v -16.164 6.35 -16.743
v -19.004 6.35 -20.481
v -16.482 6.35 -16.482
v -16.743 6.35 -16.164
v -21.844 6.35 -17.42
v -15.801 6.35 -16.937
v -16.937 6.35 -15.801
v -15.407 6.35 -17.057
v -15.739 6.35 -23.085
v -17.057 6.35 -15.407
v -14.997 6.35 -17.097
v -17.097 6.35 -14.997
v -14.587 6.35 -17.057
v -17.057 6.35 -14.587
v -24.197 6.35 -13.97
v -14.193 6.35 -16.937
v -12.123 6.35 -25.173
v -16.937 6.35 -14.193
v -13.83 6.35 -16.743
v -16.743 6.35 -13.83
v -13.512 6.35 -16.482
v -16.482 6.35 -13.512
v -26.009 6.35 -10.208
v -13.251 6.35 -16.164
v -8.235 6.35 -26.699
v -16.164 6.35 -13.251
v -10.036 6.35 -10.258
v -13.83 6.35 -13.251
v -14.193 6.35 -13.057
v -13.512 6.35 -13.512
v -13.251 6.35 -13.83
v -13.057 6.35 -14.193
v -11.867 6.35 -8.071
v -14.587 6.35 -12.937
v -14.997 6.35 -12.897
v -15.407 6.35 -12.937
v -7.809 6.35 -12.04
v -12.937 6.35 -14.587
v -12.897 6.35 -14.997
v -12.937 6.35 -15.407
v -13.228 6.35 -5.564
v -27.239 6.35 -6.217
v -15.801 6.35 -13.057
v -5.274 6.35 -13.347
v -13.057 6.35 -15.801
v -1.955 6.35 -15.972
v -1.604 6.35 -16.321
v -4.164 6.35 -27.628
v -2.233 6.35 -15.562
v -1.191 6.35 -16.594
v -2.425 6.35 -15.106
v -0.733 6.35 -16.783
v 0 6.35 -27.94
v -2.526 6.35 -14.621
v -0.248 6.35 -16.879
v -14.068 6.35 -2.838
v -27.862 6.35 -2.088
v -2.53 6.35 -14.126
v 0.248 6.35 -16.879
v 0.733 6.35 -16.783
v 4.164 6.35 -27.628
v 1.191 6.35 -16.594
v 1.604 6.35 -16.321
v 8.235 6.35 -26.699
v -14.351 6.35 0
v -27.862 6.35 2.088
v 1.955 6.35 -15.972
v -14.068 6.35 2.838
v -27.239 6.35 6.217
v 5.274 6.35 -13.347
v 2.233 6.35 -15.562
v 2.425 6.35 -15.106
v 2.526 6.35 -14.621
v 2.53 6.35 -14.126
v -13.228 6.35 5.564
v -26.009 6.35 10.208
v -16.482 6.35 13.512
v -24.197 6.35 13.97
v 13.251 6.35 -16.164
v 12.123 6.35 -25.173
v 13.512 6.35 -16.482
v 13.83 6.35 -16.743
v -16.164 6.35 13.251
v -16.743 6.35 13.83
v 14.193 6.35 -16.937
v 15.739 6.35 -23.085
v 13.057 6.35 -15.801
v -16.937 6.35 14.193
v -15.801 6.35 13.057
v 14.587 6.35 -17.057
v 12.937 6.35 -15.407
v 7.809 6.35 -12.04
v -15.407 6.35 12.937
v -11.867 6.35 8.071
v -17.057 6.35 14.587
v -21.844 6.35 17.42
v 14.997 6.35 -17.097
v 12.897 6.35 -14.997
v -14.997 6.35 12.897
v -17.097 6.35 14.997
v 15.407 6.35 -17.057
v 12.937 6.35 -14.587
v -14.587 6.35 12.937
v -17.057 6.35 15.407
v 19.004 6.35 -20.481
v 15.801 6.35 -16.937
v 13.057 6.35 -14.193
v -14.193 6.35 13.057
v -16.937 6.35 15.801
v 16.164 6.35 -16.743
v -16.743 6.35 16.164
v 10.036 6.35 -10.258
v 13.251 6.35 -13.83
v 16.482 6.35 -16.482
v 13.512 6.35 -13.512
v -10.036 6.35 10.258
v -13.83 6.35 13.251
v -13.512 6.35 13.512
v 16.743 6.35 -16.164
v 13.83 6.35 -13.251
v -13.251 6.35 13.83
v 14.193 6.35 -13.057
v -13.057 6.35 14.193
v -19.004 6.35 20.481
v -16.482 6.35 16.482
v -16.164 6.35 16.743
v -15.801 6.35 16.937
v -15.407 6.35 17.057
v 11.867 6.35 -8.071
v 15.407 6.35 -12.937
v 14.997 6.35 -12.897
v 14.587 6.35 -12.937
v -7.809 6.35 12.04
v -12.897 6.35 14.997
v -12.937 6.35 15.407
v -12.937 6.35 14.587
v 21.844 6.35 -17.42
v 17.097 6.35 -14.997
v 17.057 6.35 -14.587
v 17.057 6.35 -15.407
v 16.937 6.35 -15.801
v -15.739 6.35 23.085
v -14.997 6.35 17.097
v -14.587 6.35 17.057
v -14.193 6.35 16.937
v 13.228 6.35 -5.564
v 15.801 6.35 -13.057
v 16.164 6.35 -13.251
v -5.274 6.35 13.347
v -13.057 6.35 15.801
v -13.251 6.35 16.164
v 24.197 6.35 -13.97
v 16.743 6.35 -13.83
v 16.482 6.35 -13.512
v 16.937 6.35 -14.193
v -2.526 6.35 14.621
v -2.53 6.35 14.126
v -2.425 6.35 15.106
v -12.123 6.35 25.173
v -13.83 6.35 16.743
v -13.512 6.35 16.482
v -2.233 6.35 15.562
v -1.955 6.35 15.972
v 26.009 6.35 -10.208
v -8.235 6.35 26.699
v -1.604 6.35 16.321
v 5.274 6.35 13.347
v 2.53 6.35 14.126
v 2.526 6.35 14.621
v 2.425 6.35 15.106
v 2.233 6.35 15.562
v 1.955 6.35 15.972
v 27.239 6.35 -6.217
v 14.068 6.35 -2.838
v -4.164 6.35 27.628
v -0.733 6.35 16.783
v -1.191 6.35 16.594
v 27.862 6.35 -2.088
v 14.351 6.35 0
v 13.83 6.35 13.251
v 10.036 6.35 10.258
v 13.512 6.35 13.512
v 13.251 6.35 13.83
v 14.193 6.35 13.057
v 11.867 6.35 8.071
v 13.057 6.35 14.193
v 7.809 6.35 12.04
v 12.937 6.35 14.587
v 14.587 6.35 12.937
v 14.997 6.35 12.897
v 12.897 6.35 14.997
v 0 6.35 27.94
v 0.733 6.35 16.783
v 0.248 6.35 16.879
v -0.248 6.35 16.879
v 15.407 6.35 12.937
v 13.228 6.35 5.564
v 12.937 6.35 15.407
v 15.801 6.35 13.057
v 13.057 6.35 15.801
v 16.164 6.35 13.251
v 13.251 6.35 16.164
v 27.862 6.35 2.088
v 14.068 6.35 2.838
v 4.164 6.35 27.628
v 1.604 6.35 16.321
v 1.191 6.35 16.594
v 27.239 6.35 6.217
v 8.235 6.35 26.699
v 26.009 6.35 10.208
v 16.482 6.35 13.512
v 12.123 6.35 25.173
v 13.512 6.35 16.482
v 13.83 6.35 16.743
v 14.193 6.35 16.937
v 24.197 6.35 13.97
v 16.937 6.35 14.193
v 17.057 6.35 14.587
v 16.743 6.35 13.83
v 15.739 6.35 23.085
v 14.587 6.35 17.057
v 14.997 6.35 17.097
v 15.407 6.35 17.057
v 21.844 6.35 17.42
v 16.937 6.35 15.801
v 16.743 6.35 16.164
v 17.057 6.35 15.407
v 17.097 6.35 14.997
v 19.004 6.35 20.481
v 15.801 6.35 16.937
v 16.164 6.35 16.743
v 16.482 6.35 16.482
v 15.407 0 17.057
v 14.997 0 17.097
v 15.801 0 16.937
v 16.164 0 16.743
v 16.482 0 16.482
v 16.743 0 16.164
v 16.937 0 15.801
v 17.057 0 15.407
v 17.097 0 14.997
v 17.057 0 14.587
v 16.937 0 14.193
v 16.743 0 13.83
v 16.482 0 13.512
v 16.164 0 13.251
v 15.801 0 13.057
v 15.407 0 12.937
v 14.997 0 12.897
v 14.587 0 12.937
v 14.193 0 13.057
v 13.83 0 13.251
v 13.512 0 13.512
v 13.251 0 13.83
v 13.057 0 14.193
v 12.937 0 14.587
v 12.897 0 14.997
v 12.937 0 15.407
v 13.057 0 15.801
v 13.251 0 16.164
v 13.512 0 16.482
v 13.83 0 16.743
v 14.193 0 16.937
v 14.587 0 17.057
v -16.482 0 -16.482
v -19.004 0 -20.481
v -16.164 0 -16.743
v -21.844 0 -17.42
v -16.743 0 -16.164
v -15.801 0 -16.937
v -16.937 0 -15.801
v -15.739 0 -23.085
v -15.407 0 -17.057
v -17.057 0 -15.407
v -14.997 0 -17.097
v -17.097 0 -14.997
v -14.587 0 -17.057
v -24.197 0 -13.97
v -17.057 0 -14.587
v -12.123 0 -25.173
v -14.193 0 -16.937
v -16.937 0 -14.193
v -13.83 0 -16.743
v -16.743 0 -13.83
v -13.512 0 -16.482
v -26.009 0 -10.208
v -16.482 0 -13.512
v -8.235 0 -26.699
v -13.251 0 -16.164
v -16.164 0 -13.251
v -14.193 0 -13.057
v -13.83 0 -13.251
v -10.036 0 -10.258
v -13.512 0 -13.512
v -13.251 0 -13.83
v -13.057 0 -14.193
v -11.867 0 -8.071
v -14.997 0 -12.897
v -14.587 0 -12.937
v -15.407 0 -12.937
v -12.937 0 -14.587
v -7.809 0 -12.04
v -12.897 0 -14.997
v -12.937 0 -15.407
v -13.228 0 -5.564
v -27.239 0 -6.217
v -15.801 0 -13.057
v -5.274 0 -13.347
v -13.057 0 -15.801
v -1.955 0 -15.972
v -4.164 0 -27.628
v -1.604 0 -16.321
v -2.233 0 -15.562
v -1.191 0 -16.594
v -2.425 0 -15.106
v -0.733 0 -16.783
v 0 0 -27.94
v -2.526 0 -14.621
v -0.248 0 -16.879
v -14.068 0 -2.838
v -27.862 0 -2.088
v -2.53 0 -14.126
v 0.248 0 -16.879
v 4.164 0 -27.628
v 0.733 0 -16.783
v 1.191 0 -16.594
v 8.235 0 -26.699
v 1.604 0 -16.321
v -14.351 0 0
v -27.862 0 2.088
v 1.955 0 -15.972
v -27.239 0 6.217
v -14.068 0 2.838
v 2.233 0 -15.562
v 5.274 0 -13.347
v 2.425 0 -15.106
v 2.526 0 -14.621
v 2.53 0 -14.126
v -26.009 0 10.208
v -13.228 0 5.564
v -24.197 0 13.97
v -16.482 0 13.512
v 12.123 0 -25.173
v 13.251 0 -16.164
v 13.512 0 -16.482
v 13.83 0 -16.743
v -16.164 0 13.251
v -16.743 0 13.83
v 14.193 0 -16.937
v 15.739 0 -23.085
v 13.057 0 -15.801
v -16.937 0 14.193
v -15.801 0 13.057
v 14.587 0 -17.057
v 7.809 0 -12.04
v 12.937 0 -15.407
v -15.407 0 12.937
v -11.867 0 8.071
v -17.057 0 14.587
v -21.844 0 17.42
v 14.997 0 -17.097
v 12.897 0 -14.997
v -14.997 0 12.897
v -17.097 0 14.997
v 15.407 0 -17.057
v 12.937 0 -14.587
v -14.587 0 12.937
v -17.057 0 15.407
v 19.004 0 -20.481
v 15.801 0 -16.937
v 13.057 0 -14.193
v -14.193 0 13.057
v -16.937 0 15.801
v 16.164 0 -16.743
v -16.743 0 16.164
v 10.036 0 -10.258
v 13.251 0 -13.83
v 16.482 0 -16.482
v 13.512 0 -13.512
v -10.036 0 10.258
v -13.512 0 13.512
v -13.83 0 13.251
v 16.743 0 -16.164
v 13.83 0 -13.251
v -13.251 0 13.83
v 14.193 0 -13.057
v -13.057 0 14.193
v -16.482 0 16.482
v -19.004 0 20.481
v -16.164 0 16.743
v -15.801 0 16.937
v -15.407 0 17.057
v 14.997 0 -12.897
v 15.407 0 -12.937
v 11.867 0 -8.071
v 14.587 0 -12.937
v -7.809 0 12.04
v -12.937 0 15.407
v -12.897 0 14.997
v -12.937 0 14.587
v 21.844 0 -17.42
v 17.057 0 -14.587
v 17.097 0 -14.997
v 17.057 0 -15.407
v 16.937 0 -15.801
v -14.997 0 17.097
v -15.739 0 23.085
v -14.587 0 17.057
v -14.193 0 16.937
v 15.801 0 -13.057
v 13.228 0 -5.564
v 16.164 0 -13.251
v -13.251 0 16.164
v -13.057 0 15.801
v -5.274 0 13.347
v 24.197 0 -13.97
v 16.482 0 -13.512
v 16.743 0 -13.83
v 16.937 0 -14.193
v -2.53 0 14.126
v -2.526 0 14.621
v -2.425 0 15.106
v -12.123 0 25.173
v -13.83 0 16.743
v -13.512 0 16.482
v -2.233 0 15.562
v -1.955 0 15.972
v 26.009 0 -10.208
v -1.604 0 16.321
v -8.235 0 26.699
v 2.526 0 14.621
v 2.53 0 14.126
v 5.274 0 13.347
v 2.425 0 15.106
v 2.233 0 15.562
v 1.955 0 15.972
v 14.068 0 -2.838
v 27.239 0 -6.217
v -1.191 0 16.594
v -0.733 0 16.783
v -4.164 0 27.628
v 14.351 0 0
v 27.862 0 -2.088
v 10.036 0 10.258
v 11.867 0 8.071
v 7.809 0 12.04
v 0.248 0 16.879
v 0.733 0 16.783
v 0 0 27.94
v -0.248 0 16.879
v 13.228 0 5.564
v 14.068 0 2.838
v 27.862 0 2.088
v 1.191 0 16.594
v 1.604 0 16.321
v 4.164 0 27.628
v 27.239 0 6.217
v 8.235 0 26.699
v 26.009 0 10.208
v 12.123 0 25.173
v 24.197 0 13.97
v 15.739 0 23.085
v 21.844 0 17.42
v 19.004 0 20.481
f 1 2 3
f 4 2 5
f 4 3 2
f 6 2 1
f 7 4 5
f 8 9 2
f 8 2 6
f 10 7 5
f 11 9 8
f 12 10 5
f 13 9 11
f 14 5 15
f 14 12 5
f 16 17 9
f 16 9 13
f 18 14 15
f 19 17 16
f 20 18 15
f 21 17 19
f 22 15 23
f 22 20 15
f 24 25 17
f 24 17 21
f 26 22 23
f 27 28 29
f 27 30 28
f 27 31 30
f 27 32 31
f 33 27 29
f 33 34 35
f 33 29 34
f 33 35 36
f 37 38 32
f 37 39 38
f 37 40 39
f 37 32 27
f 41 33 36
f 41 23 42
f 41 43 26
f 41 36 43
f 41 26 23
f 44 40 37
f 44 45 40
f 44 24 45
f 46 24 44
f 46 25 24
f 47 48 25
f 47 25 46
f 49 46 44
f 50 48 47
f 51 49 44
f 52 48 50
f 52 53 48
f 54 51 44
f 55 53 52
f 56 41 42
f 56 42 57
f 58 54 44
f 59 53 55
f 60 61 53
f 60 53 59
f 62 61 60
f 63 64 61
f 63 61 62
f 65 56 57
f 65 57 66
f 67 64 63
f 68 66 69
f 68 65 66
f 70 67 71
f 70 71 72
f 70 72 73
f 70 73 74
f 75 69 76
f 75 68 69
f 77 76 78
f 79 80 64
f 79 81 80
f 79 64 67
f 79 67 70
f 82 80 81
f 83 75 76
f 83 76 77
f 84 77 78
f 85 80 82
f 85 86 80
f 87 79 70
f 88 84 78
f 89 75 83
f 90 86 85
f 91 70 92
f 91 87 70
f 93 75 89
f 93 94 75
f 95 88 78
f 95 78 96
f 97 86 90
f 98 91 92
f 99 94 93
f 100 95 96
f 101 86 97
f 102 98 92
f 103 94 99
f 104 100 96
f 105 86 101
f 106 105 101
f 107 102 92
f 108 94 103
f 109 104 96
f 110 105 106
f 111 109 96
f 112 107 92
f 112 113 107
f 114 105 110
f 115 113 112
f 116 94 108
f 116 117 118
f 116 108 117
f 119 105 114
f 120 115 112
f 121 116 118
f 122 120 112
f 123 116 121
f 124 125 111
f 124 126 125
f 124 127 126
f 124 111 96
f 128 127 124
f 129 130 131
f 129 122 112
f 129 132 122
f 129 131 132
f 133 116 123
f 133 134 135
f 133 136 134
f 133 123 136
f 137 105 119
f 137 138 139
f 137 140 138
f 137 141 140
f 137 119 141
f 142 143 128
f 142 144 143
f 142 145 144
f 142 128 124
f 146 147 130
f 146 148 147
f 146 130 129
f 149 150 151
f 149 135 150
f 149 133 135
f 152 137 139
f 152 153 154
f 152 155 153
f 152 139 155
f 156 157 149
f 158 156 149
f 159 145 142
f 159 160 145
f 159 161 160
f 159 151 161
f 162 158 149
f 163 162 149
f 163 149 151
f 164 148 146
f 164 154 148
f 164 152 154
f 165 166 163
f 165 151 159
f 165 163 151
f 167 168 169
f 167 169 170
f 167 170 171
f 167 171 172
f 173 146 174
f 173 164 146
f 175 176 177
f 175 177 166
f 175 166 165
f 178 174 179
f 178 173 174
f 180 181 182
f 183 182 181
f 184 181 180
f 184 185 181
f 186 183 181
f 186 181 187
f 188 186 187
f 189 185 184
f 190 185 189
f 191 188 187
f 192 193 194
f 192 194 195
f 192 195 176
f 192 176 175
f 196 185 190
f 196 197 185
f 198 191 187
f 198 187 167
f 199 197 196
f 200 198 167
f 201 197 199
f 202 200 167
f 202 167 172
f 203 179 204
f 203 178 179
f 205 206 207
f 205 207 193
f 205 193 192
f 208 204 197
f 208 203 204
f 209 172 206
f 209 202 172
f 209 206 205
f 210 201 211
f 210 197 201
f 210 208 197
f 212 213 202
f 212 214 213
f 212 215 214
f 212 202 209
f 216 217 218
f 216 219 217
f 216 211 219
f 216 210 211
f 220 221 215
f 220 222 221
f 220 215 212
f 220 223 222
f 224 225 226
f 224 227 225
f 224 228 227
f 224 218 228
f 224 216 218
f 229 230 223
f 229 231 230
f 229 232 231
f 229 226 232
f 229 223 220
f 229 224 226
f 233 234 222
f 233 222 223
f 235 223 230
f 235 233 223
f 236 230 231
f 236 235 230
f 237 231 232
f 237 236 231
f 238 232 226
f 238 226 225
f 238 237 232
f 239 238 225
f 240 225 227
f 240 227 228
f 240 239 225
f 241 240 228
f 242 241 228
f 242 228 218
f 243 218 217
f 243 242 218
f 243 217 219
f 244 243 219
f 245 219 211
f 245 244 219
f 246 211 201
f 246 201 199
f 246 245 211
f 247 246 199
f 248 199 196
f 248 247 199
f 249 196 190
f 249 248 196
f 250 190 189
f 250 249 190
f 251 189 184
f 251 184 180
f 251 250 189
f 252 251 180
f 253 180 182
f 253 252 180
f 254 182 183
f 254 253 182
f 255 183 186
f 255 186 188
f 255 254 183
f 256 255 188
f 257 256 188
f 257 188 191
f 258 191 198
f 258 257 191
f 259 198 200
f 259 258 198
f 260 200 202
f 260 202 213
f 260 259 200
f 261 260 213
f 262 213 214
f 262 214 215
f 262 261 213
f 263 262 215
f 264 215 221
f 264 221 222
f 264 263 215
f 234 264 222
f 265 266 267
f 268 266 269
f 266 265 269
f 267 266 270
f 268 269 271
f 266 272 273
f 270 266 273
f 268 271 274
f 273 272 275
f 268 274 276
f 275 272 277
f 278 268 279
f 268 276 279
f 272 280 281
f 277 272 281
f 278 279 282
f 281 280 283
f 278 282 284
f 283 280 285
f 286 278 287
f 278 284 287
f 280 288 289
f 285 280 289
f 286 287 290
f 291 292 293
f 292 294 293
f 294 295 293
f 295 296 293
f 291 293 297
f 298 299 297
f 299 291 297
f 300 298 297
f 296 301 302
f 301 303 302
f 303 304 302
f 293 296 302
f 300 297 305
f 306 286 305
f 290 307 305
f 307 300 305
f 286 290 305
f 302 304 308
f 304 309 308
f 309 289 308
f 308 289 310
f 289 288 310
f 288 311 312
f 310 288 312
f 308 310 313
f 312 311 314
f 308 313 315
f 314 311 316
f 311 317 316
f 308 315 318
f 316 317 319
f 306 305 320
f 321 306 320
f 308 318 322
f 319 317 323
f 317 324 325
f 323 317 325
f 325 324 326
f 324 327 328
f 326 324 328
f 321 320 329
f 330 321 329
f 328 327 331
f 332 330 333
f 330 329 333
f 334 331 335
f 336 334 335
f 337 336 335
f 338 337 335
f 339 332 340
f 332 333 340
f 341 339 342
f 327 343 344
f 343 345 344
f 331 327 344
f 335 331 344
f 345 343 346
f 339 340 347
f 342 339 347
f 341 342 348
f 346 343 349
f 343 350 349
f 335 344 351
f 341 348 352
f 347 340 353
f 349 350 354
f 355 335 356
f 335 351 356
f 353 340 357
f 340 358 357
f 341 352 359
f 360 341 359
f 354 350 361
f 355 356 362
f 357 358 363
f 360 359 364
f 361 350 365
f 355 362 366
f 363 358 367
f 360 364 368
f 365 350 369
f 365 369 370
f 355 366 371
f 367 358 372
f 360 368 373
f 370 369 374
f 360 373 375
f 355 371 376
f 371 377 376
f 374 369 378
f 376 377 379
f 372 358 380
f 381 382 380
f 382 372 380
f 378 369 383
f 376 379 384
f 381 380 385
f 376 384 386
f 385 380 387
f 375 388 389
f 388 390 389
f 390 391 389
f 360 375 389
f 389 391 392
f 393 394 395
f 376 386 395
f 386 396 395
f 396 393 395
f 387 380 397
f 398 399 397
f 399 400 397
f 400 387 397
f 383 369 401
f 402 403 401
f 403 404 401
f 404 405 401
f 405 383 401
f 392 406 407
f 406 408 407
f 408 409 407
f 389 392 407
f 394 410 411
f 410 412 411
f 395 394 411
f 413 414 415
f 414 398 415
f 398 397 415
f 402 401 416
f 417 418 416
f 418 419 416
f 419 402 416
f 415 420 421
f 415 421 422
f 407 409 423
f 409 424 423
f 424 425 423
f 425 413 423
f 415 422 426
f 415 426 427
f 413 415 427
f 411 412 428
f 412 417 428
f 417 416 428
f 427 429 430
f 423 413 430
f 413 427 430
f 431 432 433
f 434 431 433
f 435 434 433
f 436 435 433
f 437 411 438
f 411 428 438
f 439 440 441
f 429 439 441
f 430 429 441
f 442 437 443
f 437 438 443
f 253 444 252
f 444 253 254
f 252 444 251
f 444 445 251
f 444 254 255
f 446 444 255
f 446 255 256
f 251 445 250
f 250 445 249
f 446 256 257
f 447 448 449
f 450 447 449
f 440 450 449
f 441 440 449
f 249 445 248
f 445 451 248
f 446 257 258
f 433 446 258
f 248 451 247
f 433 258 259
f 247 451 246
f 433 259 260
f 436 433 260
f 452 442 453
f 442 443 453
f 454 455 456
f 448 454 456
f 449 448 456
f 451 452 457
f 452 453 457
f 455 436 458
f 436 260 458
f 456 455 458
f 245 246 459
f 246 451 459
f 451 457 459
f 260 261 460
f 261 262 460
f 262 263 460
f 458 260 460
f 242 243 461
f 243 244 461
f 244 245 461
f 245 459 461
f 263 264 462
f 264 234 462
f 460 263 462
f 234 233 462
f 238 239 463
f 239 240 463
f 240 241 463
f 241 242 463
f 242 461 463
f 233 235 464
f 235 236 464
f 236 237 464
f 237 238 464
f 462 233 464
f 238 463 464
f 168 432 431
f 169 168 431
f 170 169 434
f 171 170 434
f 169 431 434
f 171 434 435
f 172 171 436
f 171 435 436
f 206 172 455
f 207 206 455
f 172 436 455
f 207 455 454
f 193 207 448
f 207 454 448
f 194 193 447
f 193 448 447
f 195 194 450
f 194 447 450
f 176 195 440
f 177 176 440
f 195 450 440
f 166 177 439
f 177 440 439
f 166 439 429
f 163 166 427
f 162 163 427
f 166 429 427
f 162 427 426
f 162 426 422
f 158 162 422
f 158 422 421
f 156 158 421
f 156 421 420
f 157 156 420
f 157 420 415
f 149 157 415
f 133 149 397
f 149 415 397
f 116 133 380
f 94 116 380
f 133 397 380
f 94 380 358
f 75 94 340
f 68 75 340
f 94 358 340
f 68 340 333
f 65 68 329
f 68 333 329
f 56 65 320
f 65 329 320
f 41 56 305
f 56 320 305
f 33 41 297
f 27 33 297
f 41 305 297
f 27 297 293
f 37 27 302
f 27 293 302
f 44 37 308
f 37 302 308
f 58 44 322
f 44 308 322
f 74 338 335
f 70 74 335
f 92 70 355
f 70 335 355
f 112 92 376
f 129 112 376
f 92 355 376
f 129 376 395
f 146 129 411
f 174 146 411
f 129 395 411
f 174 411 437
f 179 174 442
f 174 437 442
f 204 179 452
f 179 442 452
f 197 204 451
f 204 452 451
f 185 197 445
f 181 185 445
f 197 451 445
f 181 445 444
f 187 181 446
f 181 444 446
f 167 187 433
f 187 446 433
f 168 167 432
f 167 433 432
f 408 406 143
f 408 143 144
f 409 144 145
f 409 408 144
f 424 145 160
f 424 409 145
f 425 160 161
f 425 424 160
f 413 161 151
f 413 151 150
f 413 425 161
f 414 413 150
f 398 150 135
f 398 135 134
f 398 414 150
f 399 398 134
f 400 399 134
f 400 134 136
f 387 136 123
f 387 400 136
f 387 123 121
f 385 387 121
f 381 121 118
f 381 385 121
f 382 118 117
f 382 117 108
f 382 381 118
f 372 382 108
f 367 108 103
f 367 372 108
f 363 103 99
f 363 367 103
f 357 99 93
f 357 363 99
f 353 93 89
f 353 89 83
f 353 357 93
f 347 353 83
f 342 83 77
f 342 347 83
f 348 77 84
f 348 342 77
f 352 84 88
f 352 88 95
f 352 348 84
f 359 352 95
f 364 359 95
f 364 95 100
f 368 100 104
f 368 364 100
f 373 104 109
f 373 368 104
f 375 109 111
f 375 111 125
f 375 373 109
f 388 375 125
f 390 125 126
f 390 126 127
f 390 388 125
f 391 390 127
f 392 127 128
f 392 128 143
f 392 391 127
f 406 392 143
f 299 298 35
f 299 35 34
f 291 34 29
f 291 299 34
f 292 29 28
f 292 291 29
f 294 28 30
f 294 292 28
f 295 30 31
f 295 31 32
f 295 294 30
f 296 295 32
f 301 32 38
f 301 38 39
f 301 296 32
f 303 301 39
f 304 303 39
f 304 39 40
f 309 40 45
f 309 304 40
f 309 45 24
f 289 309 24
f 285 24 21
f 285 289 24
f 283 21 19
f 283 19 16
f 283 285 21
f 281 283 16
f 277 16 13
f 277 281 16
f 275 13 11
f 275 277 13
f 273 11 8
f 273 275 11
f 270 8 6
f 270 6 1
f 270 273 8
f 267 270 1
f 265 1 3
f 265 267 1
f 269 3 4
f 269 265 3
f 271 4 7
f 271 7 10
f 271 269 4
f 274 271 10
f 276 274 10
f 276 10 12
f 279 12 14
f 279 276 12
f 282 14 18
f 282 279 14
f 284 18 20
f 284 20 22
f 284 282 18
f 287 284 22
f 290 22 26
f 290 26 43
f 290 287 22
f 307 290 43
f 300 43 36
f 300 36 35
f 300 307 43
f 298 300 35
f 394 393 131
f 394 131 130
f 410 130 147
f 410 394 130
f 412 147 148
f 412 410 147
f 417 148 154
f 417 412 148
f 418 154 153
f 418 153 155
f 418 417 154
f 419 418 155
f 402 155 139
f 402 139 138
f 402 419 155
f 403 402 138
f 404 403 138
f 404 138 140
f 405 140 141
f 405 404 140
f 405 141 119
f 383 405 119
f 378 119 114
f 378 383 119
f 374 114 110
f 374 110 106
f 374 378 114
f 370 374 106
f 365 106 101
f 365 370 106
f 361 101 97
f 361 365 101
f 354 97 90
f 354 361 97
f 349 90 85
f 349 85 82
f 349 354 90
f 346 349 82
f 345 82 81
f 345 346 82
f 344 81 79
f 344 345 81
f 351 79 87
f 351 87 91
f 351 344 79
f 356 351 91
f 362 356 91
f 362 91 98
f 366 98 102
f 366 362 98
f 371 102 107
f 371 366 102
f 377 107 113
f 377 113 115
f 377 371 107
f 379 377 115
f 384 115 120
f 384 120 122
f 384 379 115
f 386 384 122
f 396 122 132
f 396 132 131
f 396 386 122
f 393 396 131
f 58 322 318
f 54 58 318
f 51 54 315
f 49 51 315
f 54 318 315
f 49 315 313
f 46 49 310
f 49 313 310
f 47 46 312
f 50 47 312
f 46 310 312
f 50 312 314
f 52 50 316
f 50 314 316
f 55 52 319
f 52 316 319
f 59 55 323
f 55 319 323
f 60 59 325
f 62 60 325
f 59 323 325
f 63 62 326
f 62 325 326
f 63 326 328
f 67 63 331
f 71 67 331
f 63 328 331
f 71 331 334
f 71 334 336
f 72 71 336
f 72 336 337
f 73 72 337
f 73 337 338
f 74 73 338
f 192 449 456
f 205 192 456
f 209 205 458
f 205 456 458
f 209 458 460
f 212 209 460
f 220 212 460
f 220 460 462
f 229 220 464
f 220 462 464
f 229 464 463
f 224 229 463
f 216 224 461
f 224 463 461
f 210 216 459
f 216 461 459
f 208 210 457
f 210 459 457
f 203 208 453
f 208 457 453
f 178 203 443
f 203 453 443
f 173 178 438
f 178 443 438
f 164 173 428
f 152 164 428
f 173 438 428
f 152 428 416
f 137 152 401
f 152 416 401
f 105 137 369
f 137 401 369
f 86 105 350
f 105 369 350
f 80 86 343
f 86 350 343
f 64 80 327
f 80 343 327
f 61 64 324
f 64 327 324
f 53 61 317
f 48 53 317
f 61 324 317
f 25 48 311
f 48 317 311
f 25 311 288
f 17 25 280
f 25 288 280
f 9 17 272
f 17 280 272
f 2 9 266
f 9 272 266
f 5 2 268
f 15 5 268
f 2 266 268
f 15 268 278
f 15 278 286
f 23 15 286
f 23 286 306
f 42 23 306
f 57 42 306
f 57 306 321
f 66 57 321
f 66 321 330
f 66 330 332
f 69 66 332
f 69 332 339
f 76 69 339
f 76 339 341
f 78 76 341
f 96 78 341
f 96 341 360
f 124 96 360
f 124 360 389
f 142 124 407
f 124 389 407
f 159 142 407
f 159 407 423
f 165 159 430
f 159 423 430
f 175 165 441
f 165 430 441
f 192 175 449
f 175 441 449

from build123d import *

# Parameters (mm, degrees)
F_0_5IN_SOCKET_R    = 27.94
F_0_5IN_SOCKET_R_2  = 2.1
BOSS_EXTRUDE1_DEPTH = 6.35


with BuildPart() as part:
    # 0.5in Socket → Boss-Extrude1 (new body)
    with BuildSketch(Plane(origin=(0, 0, 0), x_dir=(1, 0, 0), z_dir=(0, 1, 0))):
        with Locations(Location((0, 0, 0), (0, 0, 270))):
            Circle(F_0_5IN_SOCKET_R)
        with Locations(Location((-14.997027722, -14.997027722, 0), (0, 0, 270))):
            Circle(F_0_5IN_SOCKET_R_2, mode=Mode.SUBTRACT)
        with Locations(Location((-14.997027722, 14.997027722, 0), (0, 0, 270))):
            Circle(F_0_5IN_SOCKET_R_2, mode=Mode.SUBTRACT)
        with Locations(Location((14.997027722, 14.997027722, 0), (0, 0, 270))):
            Circle(F_0_5IN_SOCKET_R_2, mode=Mode.SUBTRACT)
        with Locations(Location((14.997027722, -14.997027722, 0), (0, 0, 270))):
            Circle(F_0_5IN_SOCKET_R_2, mode=Mode.SUBTRACT)
        with BuildLine():
            ThreePointArc((2.530034488, -14.126221239), (0, -16.891), (-2.530034488, -14.126221239))
            ThreePointArc((-2.530034488, -14.126221239), (-14.351, 0), (-2.530034488, 14.126221239))
            ThreePointArc((-2.530034488, 14.126221239), (0, 16.891), (2.530034488, 14.126221239))
            ThreePointArc((2.530034488, 14.126221239), (14.351, 0), (2.530034488, -14.126221239))
        make_face(mode=Mode.SUBTRACT)
    extrude(amount=BOSS_EXTRUDE1_DEPTH)


solid = part.part
